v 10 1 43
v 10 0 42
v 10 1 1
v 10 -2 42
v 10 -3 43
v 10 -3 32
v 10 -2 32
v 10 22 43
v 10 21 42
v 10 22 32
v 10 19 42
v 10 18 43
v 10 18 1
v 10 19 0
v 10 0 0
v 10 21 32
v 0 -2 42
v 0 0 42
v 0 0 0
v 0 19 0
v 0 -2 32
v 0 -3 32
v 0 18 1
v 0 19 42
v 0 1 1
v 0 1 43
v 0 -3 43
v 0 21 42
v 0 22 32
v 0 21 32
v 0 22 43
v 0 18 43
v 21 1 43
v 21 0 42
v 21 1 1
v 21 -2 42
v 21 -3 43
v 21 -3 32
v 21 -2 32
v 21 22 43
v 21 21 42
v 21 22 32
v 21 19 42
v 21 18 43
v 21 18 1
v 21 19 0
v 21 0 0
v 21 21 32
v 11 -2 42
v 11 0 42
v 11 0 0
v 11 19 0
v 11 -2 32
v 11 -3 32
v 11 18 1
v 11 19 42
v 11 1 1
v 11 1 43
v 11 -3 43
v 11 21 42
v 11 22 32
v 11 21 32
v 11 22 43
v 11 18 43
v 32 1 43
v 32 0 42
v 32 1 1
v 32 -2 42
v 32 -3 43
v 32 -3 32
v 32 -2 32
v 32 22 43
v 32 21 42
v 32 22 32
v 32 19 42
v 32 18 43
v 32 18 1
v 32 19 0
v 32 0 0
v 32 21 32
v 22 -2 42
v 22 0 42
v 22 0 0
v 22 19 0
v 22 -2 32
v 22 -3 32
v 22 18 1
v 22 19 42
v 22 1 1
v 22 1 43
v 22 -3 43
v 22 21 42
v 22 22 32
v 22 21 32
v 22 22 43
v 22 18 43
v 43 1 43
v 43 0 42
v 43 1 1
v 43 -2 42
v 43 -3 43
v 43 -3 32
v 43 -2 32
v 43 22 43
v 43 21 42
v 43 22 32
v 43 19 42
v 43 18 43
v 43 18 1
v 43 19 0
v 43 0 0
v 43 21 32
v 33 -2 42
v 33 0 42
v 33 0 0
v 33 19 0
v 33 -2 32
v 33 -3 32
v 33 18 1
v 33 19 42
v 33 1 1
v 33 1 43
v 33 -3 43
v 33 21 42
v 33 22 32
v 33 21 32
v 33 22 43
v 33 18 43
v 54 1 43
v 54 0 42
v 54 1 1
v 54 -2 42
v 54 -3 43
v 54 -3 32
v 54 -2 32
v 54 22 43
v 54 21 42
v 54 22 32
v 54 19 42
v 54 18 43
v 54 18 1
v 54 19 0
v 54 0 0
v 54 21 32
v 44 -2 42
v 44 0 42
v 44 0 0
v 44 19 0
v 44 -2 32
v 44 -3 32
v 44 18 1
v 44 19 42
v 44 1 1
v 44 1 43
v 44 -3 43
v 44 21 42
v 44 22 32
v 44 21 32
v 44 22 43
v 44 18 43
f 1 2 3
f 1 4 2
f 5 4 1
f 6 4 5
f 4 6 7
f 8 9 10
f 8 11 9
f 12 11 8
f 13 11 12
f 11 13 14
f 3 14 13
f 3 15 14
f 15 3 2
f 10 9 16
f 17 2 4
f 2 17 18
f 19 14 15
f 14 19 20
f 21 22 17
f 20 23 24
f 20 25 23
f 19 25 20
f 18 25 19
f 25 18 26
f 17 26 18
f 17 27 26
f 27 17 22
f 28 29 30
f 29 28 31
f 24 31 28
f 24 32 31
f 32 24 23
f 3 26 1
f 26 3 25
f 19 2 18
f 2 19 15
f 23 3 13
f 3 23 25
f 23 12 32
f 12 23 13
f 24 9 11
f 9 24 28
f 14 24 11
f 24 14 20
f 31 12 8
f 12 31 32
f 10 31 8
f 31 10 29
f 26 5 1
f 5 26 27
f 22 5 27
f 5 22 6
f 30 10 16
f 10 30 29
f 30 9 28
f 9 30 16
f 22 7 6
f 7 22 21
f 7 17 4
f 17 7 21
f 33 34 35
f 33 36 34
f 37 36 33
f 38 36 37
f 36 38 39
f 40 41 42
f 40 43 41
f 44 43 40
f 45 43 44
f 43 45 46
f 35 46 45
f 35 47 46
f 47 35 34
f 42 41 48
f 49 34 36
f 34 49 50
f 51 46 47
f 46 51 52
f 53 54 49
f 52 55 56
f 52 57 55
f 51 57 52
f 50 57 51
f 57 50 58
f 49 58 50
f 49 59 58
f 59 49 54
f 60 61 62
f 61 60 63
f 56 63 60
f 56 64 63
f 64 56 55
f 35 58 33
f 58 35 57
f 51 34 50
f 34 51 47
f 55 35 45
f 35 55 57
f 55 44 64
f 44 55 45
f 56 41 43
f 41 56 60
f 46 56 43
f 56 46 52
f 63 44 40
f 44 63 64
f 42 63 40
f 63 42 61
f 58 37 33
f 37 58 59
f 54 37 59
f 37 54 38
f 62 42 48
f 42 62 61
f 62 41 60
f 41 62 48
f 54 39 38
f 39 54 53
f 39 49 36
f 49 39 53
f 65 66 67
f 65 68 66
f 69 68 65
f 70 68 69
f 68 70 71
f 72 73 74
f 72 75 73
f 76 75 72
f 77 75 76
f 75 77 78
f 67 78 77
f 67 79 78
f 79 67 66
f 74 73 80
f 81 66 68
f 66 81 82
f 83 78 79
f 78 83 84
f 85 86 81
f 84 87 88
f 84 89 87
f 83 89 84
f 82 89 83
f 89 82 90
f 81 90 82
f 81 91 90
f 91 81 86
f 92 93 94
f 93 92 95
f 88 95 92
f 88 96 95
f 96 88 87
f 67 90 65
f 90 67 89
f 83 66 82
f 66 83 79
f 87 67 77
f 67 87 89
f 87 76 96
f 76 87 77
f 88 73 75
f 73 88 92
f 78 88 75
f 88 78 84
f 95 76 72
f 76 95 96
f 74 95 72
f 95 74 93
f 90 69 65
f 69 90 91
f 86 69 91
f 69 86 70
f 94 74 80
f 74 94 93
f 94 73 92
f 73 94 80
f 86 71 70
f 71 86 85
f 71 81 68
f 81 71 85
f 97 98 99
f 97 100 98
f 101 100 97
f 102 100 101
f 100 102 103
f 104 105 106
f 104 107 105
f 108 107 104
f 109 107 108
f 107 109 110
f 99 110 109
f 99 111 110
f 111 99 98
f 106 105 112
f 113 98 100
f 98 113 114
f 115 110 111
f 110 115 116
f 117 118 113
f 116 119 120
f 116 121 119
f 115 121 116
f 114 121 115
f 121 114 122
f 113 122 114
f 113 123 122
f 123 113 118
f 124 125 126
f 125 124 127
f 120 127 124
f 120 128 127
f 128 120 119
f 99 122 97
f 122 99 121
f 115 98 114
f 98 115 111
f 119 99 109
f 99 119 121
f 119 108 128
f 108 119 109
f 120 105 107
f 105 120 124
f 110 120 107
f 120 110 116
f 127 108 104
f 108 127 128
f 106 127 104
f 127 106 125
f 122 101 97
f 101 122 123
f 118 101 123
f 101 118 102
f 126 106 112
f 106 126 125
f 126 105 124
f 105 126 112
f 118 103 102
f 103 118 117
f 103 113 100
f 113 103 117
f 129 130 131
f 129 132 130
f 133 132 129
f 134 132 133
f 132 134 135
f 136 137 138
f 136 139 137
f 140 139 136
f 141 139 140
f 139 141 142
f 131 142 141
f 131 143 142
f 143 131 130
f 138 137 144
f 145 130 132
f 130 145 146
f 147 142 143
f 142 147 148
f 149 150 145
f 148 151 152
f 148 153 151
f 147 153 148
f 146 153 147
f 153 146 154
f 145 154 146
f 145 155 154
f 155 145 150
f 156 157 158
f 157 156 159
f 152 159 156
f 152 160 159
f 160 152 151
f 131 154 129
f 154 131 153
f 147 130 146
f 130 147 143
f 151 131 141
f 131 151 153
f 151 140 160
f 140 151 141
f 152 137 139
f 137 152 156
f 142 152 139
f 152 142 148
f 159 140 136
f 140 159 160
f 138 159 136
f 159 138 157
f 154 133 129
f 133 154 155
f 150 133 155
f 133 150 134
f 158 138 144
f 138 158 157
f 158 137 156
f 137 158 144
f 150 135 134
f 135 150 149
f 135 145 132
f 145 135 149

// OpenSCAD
echo(version=version());

// 4 * 2 = 8
// 4 * 10 = 40
// 5 set

terminal=true;

defH=10;
defW=10;
defD=2;
defM=20;
defBD=2;

* difference(){
    union(){

        cube([defW, defD, defH]);
        translate([0, defD + defBD, 0]) cube([defW, defD, defH]);

        translate([0, defM + defD, 0]) {
        cube([defW, defD, defH]);
        translate([0, defD + defBD, 0]) cube([defW, defD, defH]);
        }

        translate([0, 0, -defD]) cube([defW, defM + (defD + defBD) * 2, defD]);
    }
    if (terminal)
    {
        translate([0, 0, -defD]) cube([defW, defD+defBD, defH+defD]);
    }
}

difference(){
    union(){
        translate([0, 0, 0]) block();
        translate([11, 0, 0]) block();
        translate([22, 0, 0]) block();
        translate([33, 0, 0]) block();
        translate([44, 0, 0]) block();
    }
    translate([54, -4.5, -1]) cube([2, 28, 45]);
}



module block(){
    union(){
        cube([10, 1, 42]);
        cube([10, 18, 1]);
        translate([0, 18, 0]) cube([10, 1, 42]);
        translate([0, 18, 42]) cube([10, 4, 1]);
        translate([0, -3, 42]) cube([10, 4, 1]);
        translate([0, 21, 32]) cube([10, 1, 10]);
        translate([0, -3, 32]) cube([10, 1, 10]);
    }
    *translate([10, 0.3, 0]) {
        cube([1, 0.3, 42]);
        cube([1, 18, 0.3]);
        translate([0, 18, 0]) cube([1, 0.3, 42]);
        translate([0, 18, 42]) cube([1, 3.3, 0.3]);
        translate([0, -3, 42]) cube([1, 3.3, 0.3]);
        translate([0, 21, 32]) cube([1, 0.3, 10]);
        translate([0, -3, 32]) cube([1, 0.3, 10]);
    }
}
